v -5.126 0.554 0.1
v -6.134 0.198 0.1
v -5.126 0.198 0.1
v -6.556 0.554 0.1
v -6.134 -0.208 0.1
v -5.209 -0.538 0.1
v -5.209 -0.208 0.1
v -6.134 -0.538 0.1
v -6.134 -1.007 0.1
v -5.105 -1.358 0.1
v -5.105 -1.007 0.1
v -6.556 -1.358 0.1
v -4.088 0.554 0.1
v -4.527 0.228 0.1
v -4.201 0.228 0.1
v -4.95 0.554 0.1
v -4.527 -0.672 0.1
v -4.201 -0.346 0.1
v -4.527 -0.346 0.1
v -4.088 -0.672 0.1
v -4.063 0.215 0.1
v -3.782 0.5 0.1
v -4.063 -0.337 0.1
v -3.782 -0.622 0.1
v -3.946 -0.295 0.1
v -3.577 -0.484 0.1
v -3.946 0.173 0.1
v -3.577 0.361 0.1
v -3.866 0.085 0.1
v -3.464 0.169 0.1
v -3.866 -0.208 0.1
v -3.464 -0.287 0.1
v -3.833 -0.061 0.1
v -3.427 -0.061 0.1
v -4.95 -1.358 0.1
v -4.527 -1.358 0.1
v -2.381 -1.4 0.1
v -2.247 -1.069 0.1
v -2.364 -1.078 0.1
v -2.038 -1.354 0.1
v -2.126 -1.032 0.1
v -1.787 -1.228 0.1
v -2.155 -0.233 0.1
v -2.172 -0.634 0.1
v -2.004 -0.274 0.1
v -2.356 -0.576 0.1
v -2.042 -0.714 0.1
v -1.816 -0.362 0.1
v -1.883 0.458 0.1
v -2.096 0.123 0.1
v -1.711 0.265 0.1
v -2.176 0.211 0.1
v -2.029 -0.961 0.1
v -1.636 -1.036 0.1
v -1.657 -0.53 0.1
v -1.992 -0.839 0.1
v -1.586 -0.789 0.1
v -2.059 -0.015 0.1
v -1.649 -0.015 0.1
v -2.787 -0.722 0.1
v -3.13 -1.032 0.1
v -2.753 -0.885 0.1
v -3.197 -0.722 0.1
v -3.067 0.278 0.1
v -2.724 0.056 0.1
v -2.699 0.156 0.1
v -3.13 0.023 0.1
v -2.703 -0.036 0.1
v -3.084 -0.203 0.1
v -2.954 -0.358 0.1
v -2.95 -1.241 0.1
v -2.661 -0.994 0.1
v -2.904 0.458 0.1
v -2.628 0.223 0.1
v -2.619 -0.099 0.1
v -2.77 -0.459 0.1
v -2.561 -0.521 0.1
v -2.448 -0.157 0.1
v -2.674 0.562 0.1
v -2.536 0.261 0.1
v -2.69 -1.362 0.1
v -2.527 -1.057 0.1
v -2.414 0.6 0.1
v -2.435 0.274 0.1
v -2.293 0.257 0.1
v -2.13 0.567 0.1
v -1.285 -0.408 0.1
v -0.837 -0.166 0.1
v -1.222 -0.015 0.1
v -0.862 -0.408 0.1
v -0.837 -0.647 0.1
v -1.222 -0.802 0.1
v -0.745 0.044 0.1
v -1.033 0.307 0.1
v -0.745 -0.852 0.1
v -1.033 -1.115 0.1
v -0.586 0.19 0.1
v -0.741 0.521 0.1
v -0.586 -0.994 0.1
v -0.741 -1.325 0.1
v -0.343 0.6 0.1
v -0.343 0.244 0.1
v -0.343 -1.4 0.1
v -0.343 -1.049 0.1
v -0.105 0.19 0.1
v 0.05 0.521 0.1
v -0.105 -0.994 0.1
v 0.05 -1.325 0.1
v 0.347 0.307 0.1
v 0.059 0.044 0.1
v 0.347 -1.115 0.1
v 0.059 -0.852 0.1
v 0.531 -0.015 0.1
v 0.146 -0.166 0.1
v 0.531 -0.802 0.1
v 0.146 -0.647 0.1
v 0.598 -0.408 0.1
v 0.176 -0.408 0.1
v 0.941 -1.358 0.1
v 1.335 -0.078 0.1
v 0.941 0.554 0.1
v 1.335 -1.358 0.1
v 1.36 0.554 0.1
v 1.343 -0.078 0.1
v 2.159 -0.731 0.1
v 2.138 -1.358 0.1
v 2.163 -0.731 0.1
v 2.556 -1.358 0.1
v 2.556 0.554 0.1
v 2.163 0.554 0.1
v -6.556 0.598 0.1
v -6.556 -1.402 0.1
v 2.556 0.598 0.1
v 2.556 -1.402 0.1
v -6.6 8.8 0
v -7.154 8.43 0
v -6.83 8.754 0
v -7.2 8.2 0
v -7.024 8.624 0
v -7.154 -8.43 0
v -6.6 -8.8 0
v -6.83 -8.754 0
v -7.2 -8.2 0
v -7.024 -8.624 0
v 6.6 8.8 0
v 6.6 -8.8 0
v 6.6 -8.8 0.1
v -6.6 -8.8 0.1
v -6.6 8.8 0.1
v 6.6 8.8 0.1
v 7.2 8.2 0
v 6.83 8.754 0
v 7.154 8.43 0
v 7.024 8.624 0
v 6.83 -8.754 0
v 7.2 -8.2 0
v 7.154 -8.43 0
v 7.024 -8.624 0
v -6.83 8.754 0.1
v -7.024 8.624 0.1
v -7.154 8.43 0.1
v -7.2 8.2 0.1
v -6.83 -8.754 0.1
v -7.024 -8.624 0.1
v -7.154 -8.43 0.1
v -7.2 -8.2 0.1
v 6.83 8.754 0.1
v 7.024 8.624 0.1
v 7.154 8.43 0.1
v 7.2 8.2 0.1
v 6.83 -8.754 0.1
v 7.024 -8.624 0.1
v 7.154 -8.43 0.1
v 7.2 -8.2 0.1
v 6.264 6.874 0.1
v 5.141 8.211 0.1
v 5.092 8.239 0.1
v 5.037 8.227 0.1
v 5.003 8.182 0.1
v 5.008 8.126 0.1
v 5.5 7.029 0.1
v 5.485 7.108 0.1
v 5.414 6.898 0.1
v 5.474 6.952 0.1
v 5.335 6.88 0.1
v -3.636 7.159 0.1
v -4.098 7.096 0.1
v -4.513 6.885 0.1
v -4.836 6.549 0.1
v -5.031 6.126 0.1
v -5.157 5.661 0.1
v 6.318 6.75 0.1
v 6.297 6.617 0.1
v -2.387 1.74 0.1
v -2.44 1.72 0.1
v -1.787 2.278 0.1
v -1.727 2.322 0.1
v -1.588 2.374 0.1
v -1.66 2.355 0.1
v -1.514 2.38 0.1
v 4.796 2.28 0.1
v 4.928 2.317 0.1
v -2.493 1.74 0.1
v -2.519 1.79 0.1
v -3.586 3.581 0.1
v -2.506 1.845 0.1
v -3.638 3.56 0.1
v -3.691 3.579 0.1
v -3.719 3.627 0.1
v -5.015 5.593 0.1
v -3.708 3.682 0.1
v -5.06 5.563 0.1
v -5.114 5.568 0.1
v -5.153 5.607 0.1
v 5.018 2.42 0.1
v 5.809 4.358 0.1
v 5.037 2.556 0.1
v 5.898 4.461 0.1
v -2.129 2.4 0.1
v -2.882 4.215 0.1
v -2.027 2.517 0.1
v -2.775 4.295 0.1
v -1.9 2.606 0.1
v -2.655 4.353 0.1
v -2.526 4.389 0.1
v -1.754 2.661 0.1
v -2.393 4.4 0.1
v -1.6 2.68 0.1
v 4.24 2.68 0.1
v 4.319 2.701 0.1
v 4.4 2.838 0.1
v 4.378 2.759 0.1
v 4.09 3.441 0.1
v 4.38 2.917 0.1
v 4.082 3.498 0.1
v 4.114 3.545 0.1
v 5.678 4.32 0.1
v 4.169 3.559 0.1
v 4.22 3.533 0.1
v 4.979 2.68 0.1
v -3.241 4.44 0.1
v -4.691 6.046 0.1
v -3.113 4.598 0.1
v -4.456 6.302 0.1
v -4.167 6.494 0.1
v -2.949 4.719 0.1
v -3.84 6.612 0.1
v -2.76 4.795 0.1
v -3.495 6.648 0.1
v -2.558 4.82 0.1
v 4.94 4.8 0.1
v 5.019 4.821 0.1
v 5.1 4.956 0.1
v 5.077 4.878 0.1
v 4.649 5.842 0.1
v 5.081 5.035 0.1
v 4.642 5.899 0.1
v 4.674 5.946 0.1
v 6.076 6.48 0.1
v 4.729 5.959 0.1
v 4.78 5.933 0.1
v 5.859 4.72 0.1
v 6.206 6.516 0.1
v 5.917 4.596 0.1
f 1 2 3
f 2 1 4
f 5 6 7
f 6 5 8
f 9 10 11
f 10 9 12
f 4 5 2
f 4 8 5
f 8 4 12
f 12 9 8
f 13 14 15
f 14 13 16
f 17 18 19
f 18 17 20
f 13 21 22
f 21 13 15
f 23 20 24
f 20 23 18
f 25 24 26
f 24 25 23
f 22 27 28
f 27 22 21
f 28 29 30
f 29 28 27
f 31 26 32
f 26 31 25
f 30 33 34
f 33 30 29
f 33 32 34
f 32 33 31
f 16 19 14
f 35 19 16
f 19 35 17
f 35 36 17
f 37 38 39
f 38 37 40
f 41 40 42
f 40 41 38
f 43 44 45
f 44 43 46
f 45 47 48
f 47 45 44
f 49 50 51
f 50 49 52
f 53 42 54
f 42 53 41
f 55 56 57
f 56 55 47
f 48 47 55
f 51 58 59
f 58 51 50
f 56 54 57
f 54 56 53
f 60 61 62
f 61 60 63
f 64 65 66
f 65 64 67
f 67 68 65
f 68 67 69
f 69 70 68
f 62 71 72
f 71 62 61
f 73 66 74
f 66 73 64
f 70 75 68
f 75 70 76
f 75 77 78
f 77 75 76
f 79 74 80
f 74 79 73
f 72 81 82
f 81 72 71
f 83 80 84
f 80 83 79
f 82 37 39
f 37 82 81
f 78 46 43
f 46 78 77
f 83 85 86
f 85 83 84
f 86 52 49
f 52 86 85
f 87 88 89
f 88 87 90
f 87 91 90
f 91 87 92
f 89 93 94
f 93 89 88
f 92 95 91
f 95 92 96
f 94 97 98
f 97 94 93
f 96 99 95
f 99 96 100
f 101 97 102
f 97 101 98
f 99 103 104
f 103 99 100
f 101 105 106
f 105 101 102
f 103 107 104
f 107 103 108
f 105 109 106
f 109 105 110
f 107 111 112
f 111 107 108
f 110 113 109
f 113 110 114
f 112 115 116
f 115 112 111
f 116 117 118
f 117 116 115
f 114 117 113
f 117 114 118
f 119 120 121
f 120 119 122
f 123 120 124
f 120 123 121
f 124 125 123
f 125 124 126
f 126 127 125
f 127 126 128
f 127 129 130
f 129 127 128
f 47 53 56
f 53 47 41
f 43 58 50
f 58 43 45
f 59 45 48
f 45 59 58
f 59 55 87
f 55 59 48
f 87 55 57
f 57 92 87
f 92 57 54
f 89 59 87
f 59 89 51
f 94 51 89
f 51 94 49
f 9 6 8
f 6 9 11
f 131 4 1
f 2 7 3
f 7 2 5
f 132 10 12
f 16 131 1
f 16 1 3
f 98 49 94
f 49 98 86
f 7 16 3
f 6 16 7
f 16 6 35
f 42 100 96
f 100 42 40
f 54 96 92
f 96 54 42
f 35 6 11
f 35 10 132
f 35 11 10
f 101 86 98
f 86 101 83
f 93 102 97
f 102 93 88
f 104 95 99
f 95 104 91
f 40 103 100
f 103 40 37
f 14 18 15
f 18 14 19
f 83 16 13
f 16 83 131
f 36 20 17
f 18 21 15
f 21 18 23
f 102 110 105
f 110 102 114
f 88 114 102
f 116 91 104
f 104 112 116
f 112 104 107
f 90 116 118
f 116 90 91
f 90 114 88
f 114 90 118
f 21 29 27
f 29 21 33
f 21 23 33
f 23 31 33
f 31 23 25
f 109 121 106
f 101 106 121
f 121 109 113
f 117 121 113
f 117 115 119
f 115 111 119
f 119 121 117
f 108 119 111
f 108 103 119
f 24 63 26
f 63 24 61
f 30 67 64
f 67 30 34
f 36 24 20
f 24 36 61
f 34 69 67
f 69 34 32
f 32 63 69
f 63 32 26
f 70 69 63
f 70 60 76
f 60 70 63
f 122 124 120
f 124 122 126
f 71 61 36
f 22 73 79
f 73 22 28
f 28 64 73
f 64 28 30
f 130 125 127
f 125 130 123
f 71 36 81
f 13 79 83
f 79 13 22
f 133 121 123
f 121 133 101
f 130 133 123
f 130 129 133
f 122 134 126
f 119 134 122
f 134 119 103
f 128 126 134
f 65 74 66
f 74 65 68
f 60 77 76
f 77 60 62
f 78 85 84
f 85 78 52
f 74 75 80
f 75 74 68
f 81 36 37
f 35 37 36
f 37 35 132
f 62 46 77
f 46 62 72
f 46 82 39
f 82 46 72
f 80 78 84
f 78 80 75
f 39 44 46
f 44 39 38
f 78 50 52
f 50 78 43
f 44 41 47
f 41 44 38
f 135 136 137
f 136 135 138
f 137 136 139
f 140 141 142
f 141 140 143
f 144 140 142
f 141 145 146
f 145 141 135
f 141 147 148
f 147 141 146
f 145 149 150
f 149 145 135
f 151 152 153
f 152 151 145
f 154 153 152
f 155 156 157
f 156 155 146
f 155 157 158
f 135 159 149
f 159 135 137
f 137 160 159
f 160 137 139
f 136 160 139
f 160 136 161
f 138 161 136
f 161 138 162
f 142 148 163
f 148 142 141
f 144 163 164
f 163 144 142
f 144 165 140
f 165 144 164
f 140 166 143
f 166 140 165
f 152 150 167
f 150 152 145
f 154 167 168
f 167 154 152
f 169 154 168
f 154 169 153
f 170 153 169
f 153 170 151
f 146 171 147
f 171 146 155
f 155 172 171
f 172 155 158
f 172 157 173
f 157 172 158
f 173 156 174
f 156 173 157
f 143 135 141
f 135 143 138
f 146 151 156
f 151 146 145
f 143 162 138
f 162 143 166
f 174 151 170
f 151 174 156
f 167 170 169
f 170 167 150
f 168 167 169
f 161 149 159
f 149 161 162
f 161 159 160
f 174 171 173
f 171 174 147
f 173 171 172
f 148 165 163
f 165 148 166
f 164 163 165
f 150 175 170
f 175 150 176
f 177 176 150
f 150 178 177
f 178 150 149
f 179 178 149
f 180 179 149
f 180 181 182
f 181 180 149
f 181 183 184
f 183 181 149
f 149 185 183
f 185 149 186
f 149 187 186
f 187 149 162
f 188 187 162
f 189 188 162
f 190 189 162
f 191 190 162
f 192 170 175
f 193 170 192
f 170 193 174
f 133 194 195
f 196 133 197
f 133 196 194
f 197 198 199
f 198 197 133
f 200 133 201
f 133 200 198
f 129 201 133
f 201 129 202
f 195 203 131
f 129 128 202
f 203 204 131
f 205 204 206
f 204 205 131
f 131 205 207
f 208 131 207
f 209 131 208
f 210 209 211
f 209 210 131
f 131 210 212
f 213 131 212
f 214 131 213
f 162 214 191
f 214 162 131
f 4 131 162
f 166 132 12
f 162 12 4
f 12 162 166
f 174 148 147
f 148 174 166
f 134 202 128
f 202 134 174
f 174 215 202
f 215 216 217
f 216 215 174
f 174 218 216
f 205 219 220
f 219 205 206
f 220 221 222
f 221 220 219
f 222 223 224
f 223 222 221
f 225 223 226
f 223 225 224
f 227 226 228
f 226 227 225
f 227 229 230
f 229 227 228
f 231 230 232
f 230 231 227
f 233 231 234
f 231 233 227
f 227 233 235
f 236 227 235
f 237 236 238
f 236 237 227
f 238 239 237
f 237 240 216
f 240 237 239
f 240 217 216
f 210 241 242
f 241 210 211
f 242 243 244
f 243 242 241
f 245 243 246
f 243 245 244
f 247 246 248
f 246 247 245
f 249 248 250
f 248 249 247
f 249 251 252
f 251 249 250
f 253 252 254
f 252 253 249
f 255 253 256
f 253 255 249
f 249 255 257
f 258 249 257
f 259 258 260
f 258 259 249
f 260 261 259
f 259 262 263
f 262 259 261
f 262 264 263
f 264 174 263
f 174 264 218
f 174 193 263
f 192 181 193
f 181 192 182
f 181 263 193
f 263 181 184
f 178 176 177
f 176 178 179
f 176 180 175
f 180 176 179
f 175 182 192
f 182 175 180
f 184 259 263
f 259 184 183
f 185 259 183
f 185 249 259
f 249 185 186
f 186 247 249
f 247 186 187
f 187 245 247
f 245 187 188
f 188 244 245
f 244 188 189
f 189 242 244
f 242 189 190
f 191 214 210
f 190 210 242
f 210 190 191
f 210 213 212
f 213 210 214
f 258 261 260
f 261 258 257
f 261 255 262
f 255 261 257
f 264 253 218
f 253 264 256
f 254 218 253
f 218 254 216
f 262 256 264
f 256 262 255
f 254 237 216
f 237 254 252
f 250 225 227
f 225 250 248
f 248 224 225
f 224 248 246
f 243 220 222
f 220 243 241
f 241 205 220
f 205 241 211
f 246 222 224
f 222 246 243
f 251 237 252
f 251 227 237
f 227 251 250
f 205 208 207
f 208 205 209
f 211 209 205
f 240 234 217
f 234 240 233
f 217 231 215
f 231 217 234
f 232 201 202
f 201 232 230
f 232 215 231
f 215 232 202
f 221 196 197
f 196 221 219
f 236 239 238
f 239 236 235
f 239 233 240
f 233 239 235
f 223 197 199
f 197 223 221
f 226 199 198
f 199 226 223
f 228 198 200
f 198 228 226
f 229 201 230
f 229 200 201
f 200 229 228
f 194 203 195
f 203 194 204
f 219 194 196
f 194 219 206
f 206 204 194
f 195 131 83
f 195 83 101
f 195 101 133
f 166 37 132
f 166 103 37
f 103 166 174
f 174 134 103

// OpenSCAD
use <../lib.scad>
use <../p/logo-epson-text-box.scad>
use <../p/logo-epson-text.scad>
use <s/6177973as01.scad>
function ldraw_lib__6177973c() = [
// 0 Sticker  2.2 x  1.8 with White "EPSON" and 3 Grey Stripes on Black Background Left
// 0 Name: 6177973c.dat
// 0 Author: Massimo Maso [Sirio]
// 0 !LDRAW_ORG Part UPDATE 2026-07
// 0 !LICENSE Licensed under CC BY 4.0 : see CAreadme.txt
// 
// 0 BFC CERTIFY CCW
  [0,"BFC","CERTIFY"],
  [0,"BFC","CCW"],
// 
// 0 !CATEGORY Sticker
// 0 !KEYWORDS 2016, 44, 6, AMG, BrickLink 75883stk01, Brickowl 129746, F1
// 0 !KEYWORDS Formula one, Hybrid, Lewis Hamilton, Mercedes, Nico Rosberg
// 0 !KEYWORDS Petronas, Rebrickable 30901, Set 75883, Set 75995, Speed Champions
// 0 !KEYWORDS Team, Toto Wolff, W07
// 
// 0 !HISTORY 2026-07-30 [OrionP] Official Update 2026-07
// 
// 0 // Logo primitives
// 1 15 -5 -.25 -1 .5 0 0 0 1 0 0 0 .5 logo-epson-text.dat
  [1,15,-5,-.25,-1,.5,0,0,0,1,0,0,0,.5, ldraw_lib__logo_epson_text()],
// 1 0 -5 -.25 -1 .5 0 0 0 1 0 0 0 .5 logo-epson-text-box.dat
  [1,0,-5,-.25,-1,.5,0,0,0,1,0,0,0,.5, ldraw_lib__logo_epson_text_box()],
// 0 // Subparts
// 1 16 0 0 0 -1 0 0 0 1 0 0 0 1 s\6177973as01.dat
  [1,16,0,0,0,-1,0,0,0,1,0,0,0,1, ldraw_lib__s__6177973as01()],
// 0 // Top face
// 0 // Complementary faces
// 3 0 -6.0988 -.25 4.3 -16.39125 -.25 1.49475 -6.0356 -.25 1.5
  [3,0,-6.0988,-.25,4.3,-16.39125,-.25,1.49475,-6.0356,-.25,1.5],
// 3 0 -6.0988 -.25 4.3 -6.0356 -.25 1.5 -.8577 -.25 1.5
  [3,0,-6.0988,-.25,4.3,-6.0356,-.25,1.5,-.8577,-.25,1.5],
// 3 0 -6.0988 -.25 4.3 -.8577 -.25 1.5 6.39125 -.25 1.49475
  [3,0,-6.0988,-.25,4.3,-.8577,-.25,1.5,6.39125,-.25,1.49475],
// 3 0 -18 -.25 -20.5 -5.9519 -.25 -3.5 -16.39125 -.25 -3.50525
  [3,0,-18,-.25,-20.5,-5.9519,-.25,-3.5,-16.39125,-.25,-3.50525],
// 4 0 -18 -.25 -20.5 18 -.25 -20.5 -.8577 -.25 -3.5 -5.9519 -.25 -3.5
  [4,0,-18,-.25,-20.5,18,-.25,-20.5,-.8577,-.25,-3.5,-5.9519,-.25,-3.5],
// 3 0 18 -.25 -20.5 6.39125 -.25 -3.50525 -.8577 -.25 -3.5
  [3,0,18,-.25,-20.5,6.39125,-.25,-3.50525,-.8577,-.25,-3.5],
];
module ldraw_lib__6177973c(step=0, col=false, unit=2/5, alt=false, line=0.2, solid=!$preview)
    makepoly(ldraw_lib__6177973c(), step=step, col=col, unit=unit, alt=alt, line=line, solid=solid);
ldraw_lib__6177973c(line=0.2);
